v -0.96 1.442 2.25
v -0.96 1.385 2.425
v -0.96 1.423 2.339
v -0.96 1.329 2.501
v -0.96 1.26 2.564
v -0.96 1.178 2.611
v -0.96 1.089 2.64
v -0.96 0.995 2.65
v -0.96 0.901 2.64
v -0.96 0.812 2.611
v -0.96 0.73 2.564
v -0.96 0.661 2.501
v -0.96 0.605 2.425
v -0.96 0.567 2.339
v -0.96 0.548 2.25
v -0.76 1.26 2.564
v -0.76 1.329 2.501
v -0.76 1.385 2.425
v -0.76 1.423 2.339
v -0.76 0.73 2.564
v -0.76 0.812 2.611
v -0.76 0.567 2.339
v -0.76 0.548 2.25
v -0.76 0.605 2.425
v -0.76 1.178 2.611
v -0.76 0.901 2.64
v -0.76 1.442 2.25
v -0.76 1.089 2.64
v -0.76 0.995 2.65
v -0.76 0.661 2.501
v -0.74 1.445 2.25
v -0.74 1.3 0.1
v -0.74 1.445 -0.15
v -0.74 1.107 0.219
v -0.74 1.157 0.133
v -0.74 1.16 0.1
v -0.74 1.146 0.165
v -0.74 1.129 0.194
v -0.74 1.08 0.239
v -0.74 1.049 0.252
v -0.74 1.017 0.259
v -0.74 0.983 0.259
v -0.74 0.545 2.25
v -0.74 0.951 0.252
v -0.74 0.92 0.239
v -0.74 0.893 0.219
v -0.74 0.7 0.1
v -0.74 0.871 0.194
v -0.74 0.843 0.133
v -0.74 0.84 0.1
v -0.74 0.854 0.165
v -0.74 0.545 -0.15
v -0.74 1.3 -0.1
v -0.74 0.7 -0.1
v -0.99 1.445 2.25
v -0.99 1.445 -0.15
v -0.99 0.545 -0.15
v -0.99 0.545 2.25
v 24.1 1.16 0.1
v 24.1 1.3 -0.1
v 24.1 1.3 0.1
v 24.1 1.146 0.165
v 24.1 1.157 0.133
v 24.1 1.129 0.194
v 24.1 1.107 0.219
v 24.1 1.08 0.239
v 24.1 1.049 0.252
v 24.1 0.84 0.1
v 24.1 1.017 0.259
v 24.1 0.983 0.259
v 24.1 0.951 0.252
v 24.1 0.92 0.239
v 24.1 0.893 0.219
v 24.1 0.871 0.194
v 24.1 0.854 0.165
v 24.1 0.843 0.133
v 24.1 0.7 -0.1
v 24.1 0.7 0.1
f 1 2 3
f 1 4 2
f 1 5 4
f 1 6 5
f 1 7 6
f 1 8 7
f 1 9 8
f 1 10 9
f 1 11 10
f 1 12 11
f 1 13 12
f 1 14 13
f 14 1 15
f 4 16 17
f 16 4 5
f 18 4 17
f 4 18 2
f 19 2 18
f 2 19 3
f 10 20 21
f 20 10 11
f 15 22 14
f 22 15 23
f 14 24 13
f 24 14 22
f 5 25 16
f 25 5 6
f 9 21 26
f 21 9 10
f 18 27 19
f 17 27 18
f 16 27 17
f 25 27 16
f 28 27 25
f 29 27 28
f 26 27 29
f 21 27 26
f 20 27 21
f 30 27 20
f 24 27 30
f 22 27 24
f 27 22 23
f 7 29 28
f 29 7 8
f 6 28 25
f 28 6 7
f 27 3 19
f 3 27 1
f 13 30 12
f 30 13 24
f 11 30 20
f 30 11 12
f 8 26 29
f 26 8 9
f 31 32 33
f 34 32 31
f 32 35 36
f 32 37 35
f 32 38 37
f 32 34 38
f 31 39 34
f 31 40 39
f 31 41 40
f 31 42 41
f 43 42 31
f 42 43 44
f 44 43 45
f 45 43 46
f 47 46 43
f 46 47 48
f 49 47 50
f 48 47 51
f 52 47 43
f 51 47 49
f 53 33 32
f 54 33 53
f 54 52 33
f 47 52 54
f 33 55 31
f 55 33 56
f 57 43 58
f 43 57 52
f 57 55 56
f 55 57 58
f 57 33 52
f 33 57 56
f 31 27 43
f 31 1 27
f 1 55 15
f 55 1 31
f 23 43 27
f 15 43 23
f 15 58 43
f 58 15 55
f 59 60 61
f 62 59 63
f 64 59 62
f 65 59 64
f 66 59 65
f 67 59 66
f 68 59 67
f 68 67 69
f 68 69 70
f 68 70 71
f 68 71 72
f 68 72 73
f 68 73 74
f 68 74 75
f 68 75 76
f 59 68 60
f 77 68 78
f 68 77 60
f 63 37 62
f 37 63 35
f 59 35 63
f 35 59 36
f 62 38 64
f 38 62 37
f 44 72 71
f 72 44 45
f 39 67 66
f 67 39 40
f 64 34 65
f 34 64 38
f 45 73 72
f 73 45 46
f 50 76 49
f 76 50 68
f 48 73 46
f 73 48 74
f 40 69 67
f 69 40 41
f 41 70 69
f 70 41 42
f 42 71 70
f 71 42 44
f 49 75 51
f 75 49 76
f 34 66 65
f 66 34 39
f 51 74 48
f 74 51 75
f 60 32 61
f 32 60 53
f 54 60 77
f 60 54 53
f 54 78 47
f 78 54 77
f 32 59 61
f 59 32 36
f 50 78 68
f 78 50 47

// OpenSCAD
//bâton à bout plat
//Flat end stick
//Une long prisme rectangulaire avec un long demi cylindre (placer verticalement)
// Long rectangular prisim with long half-cylinder (vertical)
$fn=30; 
union()	{
translate([0,0,0])				{
rotate(a=120,v=[1,1,1])translate([1,0.1,-0.9])cylinder(r=0.16,h=25);
rotate(a=270,v=[5,0,0])translate([-0.9,-0.1,0.7])cube(size=[25,0.2,0.6]);

// bout plat à la fin du bâton
// Flat end at the end of stick
rotate(a=270,v=[1,0,0]) {
translate([-0.99,-2,1.045]){
translate([0.03,-0.2,-0.05])rotate(a=120,v=[1,1,1])cylinder(r=0.45,h=0.2);
translate([0,-0.25,-0.5])cube(size=[0.25,2.4,0.9]);
					         }

				                  }
			
											}

			}
